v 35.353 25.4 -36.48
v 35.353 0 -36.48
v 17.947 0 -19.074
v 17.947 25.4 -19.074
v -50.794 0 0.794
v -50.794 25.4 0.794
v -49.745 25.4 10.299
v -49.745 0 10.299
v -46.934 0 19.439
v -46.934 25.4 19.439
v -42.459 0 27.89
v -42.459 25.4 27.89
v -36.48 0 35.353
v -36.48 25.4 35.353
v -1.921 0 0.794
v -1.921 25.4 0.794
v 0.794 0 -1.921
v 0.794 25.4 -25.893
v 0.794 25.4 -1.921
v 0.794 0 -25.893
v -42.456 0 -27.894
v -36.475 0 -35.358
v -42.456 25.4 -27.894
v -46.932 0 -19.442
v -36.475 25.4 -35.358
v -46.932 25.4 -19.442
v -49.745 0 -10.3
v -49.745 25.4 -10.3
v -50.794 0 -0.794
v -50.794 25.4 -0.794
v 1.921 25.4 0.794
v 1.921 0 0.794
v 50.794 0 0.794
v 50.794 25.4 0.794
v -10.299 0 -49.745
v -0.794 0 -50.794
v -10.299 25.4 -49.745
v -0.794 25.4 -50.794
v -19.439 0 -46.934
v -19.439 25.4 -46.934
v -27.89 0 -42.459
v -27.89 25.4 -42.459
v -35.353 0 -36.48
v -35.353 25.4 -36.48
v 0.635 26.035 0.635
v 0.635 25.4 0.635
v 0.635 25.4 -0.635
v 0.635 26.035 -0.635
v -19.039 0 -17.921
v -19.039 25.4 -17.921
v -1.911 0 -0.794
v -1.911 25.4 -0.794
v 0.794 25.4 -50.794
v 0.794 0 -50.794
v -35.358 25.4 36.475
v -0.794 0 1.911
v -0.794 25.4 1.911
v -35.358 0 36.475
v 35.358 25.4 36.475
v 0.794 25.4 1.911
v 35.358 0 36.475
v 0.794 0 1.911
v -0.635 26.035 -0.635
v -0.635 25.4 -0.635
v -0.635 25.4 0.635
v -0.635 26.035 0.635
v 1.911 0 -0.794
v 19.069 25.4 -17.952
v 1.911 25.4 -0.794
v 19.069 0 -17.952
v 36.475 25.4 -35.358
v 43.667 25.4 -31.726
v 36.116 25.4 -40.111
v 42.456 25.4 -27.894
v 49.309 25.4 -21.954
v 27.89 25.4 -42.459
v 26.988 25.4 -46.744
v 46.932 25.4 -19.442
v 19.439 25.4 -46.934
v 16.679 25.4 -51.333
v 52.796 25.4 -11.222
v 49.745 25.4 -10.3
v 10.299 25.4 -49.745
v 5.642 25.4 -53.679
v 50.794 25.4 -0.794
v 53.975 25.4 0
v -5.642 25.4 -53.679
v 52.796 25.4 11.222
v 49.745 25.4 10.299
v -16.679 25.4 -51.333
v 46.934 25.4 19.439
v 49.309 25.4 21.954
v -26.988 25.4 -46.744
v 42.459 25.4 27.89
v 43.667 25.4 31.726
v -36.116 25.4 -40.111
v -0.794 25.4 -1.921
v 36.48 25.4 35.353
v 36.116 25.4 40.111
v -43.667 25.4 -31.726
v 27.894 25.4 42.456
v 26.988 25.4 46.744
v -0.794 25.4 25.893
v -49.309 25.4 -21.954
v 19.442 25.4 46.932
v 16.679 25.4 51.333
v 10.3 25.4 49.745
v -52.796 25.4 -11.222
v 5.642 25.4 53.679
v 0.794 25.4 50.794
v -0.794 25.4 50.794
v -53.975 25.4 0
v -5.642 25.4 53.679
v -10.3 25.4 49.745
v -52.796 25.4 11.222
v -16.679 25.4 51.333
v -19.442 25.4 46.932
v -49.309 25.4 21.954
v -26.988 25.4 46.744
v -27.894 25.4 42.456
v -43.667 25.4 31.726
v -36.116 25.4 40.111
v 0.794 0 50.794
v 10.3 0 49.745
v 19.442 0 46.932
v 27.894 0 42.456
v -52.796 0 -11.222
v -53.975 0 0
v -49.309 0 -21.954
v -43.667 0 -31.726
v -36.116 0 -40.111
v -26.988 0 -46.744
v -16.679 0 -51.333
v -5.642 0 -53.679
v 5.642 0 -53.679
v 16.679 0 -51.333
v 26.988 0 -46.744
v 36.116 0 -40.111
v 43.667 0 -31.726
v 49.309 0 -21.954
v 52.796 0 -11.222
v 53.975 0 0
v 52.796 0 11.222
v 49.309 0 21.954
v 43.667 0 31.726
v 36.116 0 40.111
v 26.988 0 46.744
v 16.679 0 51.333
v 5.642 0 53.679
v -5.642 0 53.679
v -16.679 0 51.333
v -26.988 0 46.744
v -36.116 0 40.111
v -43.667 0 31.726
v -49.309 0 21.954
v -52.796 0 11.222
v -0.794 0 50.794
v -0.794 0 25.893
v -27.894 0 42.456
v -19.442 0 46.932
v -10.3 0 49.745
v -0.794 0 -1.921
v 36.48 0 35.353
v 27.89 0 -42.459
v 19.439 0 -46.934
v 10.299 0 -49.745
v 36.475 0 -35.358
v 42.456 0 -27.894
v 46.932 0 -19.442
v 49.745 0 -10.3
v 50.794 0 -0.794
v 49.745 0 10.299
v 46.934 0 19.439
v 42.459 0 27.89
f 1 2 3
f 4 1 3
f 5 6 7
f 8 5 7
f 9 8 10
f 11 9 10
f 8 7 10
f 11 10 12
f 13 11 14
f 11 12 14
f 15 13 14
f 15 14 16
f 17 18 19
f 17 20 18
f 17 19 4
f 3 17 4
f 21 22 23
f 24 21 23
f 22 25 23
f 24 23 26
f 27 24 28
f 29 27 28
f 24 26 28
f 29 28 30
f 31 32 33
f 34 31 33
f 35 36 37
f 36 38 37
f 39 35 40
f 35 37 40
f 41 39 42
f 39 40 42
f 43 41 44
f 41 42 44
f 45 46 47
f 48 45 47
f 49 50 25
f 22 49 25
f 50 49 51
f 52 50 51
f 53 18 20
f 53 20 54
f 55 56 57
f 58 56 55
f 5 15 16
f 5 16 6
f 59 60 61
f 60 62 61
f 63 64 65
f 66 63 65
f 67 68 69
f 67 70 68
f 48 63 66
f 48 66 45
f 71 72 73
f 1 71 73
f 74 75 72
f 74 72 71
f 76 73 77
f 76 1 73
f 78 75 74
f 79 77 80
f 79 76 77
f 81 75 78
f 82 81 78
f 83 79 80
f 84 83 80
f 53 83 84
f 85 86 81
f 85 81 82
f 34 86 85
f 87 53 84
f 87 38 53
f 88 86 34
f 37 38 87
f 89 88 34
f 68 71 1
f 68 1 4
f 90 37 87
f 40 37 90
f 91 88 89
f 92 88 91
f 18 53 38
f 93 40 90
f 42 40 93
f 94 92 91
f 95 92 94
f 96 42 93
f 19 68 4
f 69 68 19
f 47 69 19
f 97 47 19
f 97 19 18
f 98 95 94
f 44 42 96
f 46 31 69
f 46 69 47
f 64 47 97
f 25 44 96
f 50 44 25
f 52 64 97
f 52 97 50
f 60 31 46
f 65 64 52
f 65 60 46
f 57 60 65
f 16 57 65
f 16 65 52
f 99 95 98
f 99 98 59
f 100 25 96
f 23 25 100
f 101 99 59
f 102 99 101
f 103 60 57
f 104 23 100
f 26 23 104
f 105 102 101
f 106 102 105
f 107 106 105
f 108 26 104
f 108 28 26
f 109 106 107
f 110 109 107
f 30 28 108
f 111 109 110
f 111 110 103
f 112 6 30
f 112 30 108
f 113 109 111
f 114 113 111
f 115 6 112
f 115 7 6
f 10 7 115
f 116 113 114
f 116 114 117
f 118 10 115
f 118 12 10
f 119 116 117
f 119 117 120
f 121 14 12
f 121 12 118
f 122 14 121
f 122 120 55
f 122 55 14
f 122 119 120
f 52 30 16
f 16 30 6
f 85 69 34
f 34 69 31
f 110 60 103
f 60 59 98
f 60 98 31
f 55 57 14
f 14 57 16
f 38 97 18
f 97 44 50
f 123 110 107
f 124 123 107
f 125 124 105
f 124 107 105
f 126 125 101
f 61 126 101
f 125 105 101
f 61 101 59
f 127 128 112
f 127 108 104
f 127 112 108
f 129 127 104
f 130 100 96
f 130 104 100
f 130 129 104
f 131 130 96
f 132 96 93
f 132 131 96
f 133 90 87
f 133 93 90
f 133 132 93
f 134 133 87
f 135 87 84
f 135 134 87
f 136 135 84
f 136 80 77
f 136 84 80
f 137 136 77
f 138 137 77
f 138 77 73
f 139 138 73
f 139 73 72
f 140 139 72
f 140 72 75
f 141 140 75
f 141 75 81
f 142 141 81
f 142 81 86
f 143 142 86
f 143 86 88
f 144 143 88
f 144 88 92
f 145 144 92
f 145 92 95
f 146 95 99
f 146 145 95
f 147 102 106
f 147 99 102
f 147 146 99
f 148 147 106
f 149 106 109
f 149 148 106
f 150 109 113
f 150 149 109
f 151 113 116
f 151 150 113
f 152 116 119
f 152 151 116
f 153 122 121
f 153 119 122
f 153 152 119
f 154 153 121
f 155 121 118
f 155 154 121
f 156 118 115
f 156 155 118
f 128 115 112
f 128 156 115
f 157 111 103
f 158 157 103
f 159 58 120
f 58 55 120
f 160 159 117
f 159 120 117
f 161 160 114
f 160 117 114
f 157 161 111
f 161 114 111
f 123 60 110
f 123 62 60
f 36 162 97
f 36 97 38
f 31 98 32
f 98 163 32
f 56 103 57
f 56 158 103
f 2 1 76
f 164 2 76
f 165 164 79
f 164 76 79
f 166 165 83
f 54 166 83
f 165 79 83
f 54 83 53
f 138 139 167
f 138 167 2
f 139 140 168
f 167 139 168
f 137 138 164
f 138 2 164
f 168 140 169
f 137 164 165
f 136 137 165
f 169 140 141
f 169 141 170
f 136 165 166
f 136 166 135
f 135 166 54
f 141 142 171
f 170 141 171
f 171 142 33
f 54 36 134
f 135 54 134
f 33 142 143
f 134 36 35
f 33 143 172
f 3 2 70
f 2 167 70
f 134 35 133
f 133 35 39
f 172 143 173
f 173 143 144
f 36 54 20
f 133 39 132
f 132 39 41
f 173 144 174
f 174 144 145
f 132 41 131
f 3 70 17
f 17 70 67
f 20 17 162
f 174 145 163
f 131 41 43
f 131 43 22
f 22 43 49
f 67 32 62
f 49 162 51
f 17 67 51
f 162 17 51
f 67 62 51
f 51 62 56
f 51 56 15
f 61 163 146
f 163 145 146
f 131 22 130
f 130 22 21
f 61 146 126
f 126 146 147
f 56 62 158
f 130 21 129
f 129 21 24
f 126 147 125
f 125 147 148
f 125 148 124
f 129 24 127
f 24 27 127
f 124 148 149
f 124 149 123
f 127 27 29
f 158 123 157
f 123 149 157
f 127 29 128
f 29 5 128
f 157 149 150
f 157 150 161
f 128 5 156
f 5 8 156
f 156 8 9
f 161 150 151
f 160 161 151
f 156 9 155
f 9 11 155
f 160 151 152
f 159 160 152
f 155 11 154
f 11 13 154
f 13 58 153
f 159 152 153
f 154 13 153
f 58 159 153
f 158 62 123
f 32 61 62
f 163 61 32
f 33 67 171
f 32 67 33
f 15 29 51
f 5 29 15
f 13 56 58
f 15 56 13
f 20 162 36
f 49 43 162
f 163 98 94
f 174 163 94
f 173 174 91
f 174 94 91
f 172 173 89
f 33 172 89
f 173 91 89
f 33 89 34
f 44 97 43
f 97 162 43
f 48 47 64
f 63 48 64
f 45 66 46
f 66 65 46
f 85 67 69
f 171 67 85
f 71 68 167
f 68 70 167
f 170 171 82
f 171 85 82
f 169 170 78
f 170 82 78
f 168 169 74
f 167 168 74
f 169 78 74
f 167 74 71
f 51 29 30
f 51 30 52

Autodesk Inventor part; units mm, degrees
ref_plane "YZ Plane" through (0, 0, 0) normal (1, 0, 0) x (0, 1, 0)
ref_plane "XZ Plane" through (0, 0, 0) normal (0, 1, 0) x (-1, 0, 0)
ref_plane "XY Plane" through (0, 0, 0) normal (0, 0, 1) x (1, 0, 0)
sketch "Sketch1" plane through (0, 0, 0) normal (0, 1, 0) x (-1, 0, 0)
  circle A0 centre (0, 0) radius 50.8
  circle A1 centre (0, 0) radius 53.975
  dimension "d0" = 101.6
  dimension "d1" = 107.95
extrude "Extrusion1" add sketch "Sketch1" along normal blind 25.4 contours A0 | A1
sketch "Sketch2" plane through (0, 25.4, 0) normal (0, 1, 0) x (1, 0, 0)
  circle A0 centre (0, 0) radius 50.8
  dimension "d4" = 101.6
extrude "Extrusion2" cut sketch "Sketch2" against normal blind 22.225
sketch "Sketch3" plane through (0, 3.175, 0) normal (0, 1, 0) x (1, 0, 0)
  line L0 (-0.7937, 25.8929) -> (0.7937, -25.8929) construction
  line L1 (0.7937, 25.8929) -> (-0.7937, -25.8929) construction
  circle A0 centre (0, 0) radius 53.975 projected
  line L2 (-0.7937, 1.9214) -> (-17.916, 19.0437)
  line L3 (0.7938, 1.9213) -> (17.9468, 19.0743)
  line L4 (0.0335, 1.0941) -> (-0.0357, 1.1633)
  line L5 (0.7937, -1.9112) -> (17.9683, -19.0858)
  line L6 (0.0332, -1.0843) -> (-0.0353, -1.1529)
  line L7 (-0.7938, -1.9113) -> (-17.8495, -18.967)
  line L8 (-0.0332, -1.0842) -> (0.0353, -1.1528)
  line L9 (-0.0335, 1.094) -> (0.0357, 1.1632)
  line L10 (-25.8929, 0.7937) -> (-0.7937, 0.0243) construction
  line L11 (0, 0) -> (25.8929, -0.7937) construction
  line L12 (-25.8929, 0.7937) -> (-1.9112, 0.7937)
  line L13 (-0.0243, 0.7937) -> (0.0243, 0.7937)
  line L14 (1.9113, 0.7937) -> (25.8929, 0.7937)
  line L15 (-0.7937, 1.9214) -> (-0.7937, 25.8929)
  line L16 (-0.7937, -25.8929) -> (-0.7938, -1.9113)
  line L17 (-0.7937, -0.0243) -> (-0.7937, 0.0243)
  line L18 (-1.9213, -0.7937) -> (-25.8929, -0.7937)
  line L19 (25.8929, -0.7937) -> (1.9214, -0.7937)
  line L20 (0.0243, -0.7937) -> (-0.0243, -0.7937)
  line L21 (0.7937, -1.9112) -> (0.7937, -25.8929)
  line L22 (0.7937, 25.8929) -> (0.7938, 1.9213)
  line L23 (0.7937, 0.0243) -> (0.7937, -0.0243)
  line L24 (25.8929, 0.7937) -> (0, 0) construction
  line L25 (-0.7937, -0.0243) -> (-25.8929, -0.7937) construction
  line L26 (19.0693, 17.9518) -> (1.9113, 0.7937)
  line L27 (1.1529, 0.0353) -> (1.0843, -0.0332)
  line L28 (19.0909, -17.9632) -> (1.9214, -0.7937)
  line L29 (1.1633, -0.0357) -> (1.0941, 0.0335)
  line L30 (-18.9721, -17.8445) -> (-1.9213, -0.7937)
  line L31 (-1.1632, -0.0357) -> (-1.094, 0.0335)
  line L32 (-19.0386, 17.9211) -> (-1.9112, 0.7937)
  line L33 (-1.1528, 0.0353) -> (-1.0842, -0.0332)
  line L34 (0.7937, 25.8929) -> (0.7937, 52.3915)
  line L35 (0.7937, 52.3915) -> (-0.7937, 52.3915)
  line L36 (-0.7937, 52.3915) -> (-0.7937, 25.8929)
  line L37 (-19.0386, 17.9211) -> (-38.1124, 36.995)
  line L38 (-38.1124, 36.995) -> (-36.9899, 38.1176)
  line L39 (-36.9899, 38.1176) -> (-17.916, 19.0437)
  line L40 (-25.8929, -0.7937) -> (-52.6358, -0.7937)
  line L41 (-52.6358, -0.7937) -> (-52.6358, 0.7937)
  line L42 (-52.6358, 0.7937) -> (-25.8929, 0.7937)
  line L43 (-17.8495, -18.967) -> (-36.1442, -37.2617)
  line L44 (-36.1442, -37.2617) -> (-37.2668, -36.1392)
  line L45 (-37.2668, -36.1392) -> (-18.9721, -17.8445)
  line L46 (0.7937, -25.8929) -> (0.7937, -52.94)
  line L47 (0.7937, -52.94) -> (-0.7937, -52.94)
  line L48 (-0.7937, -52.94) -> (-0.7937, -25.8929)
  line L49 (17.9683, -19.0858) -> (36.3915, -37.509)
  line L50 (36.3915, -37.509) -> (37.5141, -36.3864)
  line L51 (37.5141, -36.3864) -> (19.0909, -17.9632)
  line L52 (25.8929, -0.7937) -> (52.8491, -0.7937)
  line L53 (52.8491, -0.7937) -> (52.8491, 0.7937)
  line L54 (52.8491, 0.7937) -> (25.8929, 0.7937)
  line L55 (19.0693, 17.9518) -> (38.1125, 36.995)
  line L56 (38.1125, 36.995) -> (36.99, 38.1176)
  line L57 (36.99, 38.1176) -> (17.9468, 19.0743)
  point P0 (0.7938, -0.7937)
  point P1 (-0.7938, 0.7937)
  point P2 (-0.7938, -0.7937)
  point P3 (0.7938, 0.7937)
  dimension "d7" = 1.5875
  dimension "d8" = 1.5875
  dimension "d9" = 1.5875
  dimension "d13" = 1.5875
sketch "Sketch5" plane through (0, 3.175, 0) normal (0, 1, 0) x (1, 0, 0)
  circle A0 centre (0, 0) radius 50.8 projected
  circle A1 centre (0, 0) radius 50.8 projected
  circle A2 centre (0, 0) radius 50.8 projected
  circle A3 centre (0, 0) radius 50.8 projected
  circle A4 centre (0, 0) radius 50.8 projected
  circle A5 centre (0, 0) radius 50.8 projected
  circle A6 centre (0, 0) radius 50.8 projected
  circle A7 centre (0, 0) radius 50.8 projected
extrude "Extrusion5" cut sketch "Sketch5" against normal blind 22.225
sketch "Sketch6" plane through (0, 25.4, 0) normal (0, 1, 0) x (1, 0, 0)
  line L0 (0.635, 0.635) -> (-0.635, 0.635)
  line L1 (-0.635, 0.635) -> (-0.635, -0.635)
  line L2 (-0.635, -0.635) -> (0.635, -0.635)
  line L3 (0.635, -0.635) -> (0.635, 0.635)
  line L4 (0.635, 0.635) -> (-0.635, -0.635) construction
  line L5 (-0.635, 0.635) -> (0.635, -0.635) construction
  point P0 (0, 0)
  dimension "d21" = 1.27
  dimension "d22" = 1.27
extrude "Extrusion6" add sketch "Sketch6" along normal blind 0.635
extrude "Extrusion7" add sketch "Sketch3" along normal blind 22.225 and the other way blind 3.175 contours L15 L36 L35 L34 L22 L3 L57 L56 L55 L26 L14 L54 L53 L52 L19 L28 L51 L50 L49 L5 L21 L46 L47 L48 L16 L7 L43 L44 L45 L30 L18 L40 L41 L42 L12 L32 L37 L38 L39 L2
properties part number "FeedWheel"
